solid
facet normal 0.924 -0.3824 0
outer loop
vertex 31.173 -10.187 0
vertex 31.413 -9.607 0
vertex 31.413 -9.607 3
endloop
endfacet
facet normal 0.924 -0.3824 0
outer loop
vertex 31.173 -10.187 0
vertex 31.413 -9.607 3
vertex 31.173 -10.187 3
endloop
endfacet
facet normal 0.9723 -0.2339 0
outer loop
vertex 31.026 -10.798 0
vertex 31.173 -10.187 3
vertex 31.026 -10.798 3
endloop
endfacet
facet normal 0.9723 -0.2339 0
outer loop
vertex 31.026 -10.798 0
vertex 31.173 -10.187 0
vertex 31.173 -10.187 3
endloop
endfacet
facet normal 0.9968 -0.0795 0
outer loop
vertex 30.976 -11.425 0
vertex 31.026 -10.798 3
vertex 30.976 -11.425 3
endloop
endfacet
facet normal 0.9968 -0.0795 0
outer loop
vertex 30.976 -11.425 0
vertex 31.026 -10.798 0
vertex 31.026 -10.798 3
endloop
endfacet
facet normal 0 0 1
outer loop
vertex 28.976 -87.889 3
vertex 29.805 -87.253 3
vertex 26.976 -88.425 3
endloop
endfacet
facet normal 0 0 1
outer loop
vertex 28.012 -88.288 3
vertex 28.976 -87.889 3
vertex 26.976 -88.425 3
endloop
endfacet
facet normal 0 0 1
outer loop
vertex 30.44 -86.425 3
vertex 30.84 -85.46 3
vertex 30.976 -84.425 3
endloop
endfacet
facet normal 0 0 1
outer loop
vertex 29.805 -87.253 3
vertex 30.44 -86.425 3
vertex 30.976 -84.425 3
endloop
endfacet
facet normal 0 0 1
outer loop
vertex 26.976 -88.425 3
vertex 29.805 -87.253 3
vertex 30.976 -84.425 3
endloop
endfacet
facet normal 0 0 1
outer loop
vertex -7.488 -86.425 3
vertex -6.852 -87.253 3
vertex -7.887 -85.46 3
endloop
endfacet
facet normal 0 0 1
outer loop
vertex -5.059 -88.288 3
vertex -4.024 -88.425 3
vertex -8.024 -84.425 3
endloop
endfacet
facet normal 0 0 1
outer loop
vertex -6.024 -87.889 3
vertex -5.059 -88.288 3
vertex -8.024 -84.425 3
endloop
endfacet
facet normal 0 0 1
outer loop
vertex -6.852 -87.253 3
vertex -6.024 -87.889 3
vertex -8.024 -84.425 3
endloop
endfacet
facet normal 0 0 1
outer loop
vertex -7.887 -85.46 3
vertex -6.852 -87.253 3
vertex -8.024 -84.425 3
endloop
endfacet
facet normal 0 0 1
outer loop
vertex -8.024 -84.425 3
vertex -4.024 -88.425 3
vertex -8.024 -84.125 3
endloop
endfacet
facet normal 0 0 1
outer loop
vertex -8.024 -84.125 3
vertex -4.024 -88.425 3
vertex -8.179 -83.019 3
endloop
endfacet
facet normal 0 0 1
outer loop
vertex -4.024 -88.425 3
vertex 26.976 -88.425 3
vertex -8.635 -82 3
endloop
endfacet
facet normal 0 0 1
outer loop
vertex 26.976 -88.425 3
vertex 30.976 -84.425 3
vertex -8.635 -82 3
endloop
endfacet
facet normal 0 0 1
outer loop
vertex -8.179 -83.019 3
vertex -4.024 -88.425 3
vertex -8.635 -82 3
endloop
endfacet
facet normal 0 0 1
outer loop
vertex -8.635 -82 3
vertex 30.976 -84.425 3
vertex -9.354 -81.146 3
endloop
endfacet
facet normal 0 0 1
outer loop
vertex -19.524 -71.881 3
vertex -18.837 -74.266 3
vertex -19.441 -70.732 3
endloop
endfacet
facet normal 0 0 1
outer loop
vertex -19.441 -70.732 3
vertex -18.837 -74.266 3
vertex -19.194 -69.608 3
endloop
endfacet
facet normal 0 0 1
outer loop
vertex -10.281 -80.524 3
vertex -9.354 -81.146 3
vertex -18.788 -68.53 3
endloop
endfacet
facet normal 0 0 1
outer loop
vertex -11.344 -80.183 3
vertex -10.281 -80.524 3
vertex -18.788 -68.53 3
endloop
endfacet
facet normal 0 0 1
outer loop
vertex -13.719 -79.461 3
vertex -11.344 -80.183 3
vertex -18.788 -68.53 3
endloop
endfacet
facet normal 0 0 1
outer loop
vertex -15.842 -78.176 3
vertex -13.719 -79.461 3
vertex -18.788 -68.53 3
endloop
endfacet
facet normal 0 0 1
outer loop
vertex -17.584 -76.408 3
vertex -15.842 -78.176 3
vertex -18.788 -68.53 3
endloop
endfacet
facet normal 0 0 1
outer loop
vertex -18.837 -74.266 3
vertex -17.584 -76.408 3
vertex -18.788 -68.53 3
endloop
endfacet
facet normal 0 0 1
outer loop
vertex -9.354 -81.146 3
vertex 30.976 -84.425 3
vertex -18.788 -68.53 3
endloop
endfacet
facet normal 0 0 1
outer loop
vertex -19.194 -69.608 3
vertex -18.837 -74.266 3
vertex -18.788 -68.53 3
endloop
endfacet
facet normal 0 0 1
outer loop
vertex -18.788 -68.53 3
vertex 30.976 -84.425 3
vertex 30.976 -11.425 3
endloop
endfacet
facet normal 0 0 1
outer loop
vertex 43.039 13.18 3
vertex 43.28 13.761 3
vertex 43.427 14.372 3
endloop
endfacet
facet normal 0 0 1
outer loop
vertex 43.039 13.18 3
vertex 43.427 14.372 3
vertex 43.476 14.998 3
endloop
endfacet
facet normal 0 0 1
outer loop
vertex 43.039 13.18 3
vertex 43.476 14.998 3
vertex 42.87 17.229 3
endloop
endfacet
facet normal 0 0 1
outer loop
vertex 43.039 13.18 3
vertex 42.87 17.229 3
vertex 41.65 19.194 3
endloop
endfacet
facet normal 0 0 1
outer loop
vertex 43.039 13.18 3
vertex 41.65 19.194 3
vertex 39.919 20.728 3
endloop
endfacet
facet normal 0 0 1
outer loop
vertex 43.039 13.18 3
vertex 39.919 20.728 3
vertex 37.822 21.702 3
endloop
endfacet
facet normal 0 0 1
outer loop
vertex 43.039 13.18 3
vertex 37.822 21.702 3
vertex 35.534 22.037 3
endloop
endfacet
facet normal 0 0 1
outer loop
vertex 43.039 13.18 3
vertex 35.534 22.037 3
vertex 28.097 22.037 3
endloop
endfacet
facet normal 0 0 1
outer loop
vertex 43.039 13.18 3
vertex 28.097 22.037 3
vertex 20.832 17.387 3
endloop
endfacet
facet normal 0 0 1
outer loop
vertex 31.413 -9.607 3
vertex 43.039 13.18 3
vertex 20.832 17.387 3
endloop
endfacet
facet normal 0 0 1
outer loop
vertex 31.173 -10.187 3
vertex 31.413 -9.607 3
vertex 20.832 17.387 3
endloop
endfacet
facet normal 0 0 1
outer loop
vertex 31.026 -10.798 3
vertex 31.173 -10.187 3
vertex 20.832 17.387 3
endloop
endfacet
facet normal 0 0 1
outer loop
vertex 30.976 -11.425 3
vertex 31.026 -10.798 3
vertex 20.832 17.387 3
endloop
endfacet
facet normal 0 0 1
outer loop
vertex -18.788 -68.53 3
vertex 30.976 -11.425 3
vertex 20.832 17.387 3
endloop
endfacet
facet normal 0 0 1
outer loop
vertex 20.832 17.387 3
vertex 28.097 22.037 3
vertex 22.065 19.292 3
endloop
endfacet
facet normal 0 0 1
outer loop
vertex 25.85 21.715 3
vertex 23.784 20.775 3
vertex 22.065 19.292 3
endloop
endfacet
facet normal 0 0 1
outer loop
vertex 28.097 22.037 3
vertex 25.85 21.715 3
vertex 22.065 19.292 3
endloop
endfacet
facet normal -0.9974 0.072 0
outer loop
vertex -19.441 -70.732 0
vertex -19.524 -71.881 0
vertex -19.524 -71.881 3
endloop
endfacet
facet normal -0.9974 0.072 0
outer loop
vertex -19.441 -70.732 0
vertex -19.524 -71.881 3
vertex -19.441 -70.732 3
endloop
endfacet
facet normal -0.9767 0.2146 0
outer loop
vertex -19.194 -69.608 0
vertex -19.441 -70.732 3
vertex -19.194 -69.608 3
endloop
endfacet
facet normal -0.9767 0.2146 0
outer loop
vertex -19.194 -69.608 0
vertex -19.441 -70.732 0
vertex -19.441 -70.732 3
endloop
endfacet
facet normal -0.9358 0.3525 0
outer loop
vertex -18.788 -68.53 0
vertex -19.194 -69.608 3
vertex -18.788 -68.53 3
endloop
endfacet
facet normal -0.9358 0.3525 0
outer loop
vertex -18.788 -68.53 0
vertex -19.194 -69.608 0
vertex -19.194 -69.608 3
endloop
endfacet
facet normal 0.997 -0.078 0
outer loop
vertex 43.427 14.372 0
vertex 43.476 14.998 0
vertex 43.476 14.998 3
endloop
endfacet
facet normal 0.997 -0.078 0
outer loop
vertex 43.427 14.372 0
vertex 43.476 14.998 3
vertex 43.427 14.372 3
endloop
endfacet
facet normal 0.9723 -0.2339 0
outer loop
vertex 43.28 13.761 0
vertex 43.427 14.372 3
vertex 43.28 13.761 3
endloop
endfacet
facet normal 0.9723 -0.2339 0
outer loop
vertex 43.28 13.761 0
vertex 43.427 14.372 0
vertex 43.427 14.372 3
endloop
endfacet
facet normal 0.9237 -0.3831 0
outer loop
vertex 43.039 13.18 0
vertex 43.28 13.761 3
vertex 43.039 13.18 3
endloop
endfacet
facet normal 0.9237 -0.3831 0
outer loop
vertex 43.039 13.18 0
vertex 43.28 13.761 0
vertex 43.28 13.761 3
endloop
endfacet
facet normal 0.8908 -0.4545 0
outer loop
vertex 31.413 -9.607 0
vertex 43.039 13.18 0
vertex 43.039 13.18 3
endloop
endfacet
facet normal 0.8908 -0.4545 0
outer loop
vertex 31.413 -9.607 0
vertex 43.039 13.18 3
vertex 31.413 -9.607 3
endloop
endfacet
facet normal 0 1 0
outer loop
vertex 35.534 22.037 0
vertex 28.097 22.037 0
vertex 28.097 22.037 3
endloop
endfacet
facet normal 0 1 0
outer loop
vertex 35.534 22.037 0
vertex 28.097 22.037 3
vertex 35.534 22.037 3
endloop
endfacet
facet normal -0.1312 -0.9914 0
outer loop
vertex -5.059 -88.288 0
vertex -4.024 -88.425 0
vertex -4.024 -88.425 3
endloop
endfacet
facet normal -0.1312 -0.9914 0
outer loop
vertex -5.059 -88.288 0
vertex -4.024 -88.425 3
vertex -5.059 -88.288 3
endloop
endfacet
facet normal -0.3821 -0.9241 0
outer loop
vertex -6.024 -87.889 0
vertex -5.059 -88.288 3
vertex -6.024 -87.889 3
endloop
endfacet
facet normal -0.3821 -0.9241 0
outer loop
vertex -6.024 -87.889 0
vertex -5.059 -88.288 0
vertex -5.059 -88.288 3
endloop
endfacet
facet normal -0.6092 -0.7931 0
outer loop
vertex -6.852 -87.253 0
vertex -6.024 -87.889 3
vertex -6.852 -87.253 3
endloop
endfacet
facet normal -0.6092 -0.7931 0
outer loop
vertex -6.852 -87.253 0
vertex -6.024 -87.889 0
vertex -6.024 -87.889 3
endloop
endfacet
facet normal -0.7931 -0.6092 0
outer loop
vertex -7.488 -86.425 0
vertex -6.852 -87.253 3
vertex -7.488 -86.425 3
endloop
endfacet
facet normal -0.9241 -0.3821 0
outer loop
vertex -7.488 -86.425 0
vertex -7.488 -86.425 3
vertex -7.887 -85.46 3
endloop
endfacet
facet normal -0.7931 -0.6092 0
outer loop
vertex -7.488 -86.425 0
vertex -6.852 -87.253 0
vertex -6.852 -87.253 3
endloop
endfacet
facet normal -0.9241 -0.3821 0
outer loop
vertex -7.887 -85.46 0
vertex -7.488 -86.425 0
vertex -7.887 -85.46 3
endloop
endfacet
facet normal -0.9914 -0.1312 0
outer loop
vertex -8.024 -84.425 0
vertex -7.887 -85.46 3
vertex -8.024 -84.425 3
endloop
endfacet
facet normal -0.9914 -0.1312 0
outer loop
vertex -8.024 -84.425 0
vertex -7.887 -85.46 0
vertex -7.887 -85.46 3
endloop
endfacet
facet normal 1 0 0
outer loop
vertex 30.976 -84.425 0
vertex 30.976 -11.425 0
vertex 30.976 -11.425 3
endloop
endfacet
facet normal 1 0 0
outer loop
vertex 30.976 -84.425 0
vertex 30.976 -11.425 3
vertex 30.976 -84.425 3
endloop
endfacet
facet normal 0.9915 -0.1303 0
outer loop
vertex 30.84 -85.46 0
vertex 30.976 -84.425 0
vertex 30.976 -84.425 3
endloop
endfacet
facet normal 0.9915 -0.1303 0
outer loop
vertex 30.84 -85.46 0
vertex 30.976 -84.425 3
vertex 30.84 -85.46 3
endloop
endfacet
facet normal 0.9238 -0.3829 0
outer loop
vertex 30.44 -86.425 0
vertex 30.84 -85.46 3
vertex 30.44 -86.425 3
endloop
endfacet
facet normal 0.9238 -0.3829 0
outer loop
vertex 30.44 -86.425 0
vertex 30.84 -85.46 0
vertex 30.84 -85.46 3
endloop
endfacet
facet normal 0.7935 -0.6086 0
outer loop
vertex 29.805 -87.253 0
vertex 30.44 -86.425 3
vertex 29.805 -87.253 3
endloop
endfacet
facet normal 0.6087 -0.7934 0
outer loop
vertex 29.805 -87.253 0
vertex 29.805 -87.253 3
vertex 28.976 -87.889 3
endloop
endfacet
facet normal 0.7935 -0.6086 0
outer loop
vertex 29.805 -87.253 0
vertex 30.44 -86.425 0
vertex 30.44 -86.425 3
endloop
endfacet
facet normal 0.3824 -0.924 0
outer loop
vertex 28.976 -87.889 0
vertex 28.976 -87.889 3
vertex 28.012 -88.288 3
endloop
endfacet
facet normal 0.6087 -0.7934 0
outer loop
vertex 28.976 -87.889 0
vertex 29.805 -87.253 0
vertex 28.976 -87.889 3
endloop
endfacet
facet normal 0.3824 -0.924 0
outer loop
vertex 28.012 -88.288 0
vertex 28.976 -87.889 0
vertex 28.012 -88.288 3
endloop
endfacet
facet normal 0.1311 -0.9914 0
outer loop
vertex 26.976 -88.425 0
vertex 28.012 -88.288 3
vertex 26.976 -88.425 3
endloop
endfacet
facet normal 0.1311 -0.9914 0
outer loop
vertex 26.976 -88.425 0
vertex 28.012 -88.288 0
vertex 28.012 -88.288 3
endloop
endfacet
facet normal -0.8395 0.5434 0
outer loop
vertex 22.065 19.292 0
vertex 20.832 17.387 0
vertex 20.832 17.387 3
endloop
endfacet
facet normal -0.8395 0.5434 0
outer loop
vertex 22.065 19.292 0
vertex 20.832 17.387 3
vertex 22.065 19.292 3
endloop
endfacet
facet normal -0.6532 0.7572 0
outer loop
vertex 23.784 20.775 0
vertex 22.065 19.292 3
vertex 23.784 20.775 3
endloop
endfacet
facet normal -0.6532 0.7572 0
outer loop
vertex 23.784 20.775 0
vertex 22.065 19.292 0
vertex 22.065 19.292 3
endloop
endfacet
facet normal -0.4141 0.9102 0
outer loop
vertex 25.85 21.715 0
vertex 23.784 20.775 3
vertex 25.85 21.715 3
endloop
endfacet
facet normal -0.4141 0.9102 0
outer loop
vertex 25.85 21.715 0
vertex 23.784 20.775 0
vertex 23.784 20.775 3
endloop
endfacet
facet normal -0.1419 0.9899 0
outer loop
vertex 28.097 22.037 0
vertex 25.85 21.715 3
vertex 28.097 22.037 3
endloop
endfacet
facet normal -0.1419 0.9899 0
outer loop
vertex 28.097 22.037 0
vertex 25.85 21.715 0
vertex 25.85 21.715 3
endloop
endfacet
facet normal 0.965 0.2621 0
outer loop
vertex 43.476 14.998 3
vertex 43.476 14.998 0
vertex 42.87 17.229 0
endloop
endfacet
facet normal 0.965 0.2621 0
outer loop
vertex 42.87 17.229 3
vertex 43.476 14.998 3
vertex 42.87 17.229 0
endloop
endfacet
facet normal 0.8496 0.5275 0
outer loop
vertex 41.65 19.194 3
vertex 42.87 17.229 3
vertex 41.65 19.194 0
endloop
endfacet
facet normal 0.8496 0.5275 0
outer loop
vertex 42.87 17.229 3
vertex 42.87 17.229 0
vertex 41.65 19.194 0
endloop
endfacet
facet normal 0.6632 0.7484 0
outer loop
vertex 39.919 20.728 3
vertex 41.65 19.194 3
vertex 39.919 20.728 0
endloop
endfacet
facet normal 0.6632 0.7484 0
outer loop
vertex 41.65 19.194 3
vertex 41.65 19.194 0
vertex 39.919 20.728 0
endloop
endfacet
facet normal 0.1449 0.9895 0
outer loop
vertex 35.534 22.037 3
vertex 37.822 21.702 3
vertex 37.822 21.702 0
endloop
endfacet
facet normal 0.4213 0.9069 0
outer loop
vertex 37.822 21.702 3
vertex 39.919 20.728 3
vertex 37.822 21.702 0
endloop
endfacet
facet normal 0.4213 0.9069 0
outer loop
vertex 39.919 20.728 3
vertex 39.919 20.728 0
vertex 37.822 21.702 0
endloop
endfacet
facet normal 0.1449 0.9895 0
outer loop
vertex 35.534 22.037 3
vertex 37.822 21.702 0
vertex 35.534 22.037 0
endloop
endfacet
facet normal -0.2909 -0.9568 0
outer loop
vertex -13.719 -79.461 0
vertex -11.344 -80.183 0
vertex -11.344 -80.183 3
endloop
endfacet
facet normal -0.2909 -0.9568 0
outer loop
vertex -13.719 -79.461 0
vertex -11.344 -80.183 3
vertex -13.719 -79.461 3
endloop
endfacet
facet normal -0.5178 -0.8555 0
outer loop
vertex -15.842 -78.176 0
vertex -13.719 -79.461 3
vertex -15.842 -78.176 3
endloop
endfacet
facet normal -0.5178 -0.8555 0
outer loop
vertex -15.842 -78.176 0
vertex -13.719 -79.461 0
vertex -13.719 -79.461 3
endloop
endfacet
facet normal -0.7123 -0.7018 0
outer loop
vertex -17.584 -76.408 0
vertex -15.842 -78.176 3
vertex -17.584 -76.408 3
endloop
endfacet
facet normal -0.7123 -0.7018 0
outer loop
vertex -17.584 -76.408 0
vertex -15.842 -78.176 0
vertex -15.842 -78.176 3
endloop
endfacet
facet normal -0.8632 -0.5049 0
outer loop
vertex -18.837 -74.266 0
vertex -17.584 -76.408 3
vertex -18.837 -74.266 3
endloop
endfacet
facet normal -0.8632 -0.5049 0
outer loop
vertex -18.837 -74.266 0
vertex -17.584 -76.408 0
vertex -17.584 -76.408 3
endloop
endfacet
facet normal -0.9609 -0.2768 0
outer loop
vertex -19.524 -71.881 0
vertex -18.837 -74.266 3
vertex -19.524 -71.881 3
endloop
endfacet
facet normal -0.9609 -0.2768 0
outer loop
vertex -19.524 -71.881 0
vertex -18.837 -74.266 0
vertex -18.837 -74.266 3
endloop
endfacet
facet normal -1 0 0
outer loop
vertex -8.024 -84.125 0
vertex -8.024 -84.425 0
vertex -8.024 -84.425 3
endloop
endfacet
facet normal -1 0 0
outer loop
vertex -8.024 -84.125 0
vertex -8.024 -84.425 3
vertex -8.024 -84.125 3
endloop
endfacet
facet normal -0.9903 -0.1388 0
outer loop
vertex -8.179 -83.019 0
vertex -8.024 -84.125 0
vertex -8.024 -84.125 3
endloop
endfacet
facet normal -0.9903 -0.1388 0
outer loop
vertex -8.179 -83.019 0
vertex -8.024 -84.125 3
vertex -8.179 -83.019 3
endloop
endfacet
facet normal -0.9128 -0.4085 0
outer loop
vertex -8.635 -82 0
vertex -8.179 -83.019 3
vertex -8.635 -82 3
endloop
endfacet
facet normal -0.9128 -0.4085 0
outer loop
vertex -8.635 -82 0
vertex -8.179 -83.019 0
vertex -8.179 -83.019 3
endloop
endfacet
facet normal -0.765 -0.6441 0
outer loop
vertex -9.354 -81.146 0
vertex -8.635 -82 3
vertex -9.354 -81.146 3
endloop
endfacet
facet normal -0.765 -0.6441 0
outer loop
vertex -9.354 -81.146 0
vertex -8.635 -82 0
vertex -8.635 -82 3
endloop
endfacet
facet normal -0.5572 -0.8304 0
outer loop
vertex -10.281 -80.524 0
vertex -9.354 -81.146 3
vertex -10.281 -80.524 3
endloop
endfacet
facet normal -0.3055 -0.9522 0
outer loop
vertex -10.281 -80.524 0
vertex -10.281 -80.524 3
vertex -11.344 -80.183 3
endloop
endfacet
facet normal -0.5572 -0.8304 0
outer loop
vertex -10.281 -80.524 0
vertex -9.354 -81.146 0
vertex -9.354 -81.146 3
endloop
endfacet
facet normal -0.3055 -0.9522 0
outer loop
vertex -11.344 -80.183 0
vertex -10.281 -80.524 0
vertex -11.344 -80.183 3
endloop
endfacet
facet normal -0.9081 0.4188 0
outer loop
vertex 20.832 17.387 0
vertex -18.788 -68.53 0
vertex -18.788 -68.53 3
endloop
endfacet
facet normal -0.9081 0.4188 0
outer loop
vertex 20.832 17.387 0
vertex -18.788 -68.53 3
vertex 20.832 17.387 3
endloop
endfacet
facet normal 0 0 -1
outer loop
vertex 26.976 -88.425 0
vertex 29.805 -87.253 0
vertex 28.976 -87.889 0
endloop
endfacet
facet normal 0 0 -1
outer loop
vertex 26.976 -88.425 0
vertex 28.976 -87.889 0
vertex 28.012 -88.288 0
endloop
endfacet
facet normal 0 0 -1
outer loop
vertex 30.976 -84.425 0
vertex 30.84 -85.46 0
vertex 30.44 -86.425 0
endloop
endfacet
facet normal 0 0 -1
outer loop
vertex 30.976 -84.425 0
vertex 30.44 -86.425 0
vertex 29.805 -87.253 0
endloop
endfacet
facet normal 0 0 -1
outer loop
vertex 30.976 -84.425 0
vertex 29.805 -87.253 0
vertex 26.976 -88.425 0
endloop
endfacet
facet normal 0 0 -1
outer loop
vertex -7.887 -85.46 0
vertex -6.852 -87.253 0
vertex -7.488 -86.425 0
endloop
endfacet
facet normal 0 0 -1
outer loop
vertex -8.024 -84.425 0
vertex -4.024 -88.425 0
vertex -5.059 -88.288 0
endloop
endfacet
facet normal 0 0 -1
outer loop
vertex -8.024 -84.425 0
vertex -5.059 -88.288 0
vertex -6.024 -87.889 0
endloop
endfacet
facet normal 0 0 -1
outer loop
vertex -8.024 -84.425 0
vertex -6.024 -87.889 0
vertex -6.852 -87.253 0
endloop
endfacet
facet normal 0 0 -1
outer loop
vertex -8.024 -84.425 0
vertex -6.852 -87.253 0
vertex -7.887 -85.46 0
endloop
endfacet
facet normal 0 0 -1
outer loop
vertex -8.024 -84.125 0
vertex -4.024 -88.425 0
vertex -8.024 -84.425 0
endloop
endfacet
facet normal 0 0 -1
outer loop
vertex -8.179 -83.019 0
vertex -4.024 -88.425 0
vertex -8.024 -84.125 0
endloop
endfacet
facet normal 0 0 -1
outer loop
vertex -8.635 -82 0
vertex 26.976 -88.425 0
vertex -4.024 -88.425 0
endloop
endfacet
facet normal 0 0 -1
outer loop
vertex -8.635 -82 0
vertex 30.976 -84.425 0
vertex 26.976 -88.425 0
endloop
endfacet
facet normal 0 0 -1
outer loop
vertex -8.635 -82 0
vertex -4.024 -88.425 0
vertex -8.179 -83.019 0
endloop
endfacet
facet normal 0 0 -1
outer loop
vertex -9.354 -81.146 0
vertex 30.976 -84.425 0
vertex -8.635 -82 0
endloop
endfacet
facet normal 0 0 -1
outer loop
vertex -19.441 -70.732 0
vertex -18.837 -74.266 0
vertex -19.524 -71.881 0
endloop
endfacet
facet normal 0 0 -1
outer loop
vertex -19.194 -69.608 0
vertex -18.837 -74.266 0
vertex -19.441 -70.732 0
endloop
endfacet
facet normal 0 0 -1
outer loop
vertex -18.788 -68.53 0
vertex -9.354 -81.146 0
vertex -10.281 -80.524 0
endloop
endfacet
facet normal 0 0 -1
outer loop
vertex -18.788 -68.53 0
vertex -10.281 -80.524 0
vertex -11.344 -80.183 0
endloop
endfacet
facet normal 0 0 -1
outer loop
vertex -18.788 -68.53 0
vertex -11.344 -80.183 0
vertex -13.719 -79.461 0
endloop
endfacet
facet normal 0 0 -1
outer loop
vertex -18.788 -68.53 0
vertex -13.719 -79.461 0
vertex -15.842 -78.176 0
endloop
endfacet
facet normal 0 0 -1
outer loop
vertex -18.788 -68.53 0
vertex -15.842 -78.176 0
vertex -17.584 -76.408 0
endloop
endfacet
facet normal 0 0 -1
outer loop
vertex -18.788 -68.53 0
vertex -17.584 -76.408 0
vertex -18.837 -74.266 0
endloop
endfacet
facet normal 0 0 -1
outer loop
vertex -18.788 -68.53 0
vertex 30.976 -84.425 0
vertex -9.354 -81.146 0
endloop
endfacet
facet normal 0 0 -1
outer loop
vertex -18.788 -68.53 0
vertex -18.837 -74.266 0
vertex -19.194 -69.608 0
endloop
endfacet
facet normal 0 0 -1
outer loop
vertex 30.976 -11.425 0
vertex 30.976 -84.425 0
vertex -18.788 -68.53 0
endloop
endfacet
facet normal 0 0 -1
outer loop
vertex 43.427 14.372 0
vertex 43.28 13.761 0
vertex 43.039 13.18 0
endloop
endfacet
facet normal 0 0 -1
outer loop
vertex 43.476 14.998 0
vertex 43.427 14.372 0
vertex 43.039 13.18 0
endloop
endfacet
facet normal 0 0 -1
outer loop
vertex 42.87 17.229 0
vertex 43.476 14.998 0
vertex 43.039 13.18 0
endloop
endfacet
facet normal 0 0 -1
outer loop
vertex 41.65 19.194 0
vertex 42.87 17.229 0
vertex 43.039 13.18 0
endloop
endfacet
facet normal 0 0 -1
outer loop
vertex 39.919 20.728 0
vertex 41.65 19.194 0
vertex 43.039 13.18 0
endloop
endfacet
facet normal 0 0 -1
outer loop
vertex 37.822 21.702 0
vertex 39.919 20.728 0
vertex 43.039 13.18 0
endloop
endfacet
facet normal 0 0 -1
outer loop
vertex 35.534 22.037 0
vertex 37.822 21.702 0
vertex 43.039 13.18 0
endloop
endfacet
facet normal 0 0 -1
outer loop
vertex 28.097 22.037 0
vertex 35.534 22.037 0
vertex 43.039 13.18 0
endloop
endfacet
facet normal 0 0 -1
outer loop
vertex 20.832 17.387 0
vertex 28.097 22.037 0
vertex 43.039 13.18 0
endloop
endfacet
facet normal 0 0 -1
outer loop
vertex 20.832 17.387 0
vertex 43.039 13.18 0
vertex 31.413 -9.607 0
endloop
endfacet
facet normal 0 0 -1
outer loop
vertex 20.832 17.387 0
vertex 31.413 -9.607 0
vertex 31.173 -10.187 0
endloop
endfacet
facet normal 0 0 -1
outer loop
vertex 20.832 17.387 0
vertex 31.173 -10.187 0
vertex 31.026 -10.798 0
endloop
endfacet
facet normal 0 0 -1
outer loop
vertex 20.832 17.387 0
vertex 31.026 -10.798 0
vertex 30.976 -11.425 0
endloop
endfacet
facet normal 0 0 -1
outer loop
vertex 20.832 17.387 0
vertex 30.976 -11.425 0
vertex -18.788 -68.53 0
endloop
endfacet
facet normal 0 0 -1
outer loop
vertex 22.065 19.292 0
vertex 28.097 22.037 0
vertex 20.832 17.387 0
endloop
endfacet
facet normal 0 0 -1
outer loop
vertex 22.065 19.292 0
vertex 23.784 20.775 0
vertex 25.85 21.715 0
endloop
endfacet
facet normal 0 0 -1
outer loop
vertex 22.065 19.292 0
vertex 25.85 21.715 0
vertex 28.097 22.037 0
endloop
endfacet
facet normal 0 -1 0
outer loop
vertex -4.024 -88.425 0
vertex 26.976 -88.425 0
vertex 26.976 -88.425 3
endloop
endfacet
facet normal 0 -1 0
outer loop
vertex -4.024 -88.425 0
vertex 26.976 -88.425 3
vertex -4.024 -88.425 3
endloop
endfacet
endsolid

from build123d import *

# Parameters (mm, degrees)
BOSS_EXTRUDE1_DEPTH = 3
FILLET1_START       = -1
FILLET1_DEPTH       = 5
FILLET3_R           = 8


with BuildPart() as part:
    # Sketch1 → Boss-Extrude1 (new body)
    with BuildSketch(Plane.XY):
        with BuildLine():
            Line((43.039391211, 13.180231598), (31.413296253, -9.606914519))
            ThreePointArc((31.413296253, -9.606914519), (31.087115665, -10.489967002), (30.976343732, -11.424795886))
            Line((30.976343732, -11.424795886), (30.976343732, -84.424795886))
            ThreePointArc((30.976343732, -84.424795886), (29.804770857, -87.253223011), (26.976343732, -88.424795886))
            Line((26.976343732, -88.424795886), (-4.023656268, -88.424795886))
            ThreePointArc((-4.023656268, -88.424795886), (-6.852083393, -87.253223011), (-8.023656268, -84.424795886))
            Line((-8.023656268, -84.424795886), (-8.023656268, -84.124795886))
            ThreePointArc((-8.023656268, -84.124795886), (-9.195229143, -81.296368761), (-12.023656268, -80.124795886))
            Line((-12.023656268, -80.124795886), (-19.523656268, -80.124795886))
            Line((-19.523656268, -80.124795886), (-19.523656268, -71.88053816))
            ThreePointArc((-19.523656268, -71.88053816), (-19.337683681, -70.165610877), (-18.788412372, -68.530415961))
            Line((-18.788412372, -68.530415961), (20.832065435, 17.386780739))
            ThreePointArc((20.832065435, 17.386780739), (23.784106477, 20.774647022), (28.096821539, 22.036658539))
            Line((28.096821539, 22.036658539), (43.476343732, 22.036658539))
            Line((43.476343732, 22.036658539), (43.476343732, 14.998112965))
            ThreePointArc((43.476343732, 14.998112965), (43.365571799, 14.063284081), (43.039391211, 13.180231598))
        make_face()
    extrude(amount=BOSS_EXTRUDE1_DEPTH)

    # Fillet1: read off the stored shape, not the designer's step
    # Fillet1 outline → Fillet1 (cut)
    with BuildSketch(Plane.XY.offset(FILLET1_START)):
        with BuildLine():
            ThreePointArc((-12.023656268, -80.124795886), (-11.682584861, -80.139363626), (-11.343997774, -80.182960738))
            ThreePointArc((-11.343997774, -80.182960738), (-16.768389445, -77.346578315), (-19.523656268, -71.88053816))
            Line((-19.523656268, -71.88053816), (-19.523656268, -80.124795886))
            Line((-19.523656268, -80.124795886), (-12.023656268, -80.124795886))
        make_face()
    extrude(amount=FILLET1_DEPTH, mode=Mode.SUBTRACT)

    # Fillet3
    # the kernel refuses this fillet: 8 mm, written as the material it takes off along each edge
    with BuildSketch(Plane(origin=(43.476343732, 22.036658539, -19.855037992), x_dir=(-1, 0, 0), z_dir=(0, 0, 1))) as fillet3_piece_1:
        with BuildLine():
            CenterArc((7.942015197, 8), FILLET3_R, 186.902595068, 83.097404932)
            Line((0, 7.038545575), (0, 0))
            Line((0, 0), (7.942015197, 0))
        make_face()
    extrude(amount=42.710075985, mode=Mode.SUBTRACT)


solid = part.part
